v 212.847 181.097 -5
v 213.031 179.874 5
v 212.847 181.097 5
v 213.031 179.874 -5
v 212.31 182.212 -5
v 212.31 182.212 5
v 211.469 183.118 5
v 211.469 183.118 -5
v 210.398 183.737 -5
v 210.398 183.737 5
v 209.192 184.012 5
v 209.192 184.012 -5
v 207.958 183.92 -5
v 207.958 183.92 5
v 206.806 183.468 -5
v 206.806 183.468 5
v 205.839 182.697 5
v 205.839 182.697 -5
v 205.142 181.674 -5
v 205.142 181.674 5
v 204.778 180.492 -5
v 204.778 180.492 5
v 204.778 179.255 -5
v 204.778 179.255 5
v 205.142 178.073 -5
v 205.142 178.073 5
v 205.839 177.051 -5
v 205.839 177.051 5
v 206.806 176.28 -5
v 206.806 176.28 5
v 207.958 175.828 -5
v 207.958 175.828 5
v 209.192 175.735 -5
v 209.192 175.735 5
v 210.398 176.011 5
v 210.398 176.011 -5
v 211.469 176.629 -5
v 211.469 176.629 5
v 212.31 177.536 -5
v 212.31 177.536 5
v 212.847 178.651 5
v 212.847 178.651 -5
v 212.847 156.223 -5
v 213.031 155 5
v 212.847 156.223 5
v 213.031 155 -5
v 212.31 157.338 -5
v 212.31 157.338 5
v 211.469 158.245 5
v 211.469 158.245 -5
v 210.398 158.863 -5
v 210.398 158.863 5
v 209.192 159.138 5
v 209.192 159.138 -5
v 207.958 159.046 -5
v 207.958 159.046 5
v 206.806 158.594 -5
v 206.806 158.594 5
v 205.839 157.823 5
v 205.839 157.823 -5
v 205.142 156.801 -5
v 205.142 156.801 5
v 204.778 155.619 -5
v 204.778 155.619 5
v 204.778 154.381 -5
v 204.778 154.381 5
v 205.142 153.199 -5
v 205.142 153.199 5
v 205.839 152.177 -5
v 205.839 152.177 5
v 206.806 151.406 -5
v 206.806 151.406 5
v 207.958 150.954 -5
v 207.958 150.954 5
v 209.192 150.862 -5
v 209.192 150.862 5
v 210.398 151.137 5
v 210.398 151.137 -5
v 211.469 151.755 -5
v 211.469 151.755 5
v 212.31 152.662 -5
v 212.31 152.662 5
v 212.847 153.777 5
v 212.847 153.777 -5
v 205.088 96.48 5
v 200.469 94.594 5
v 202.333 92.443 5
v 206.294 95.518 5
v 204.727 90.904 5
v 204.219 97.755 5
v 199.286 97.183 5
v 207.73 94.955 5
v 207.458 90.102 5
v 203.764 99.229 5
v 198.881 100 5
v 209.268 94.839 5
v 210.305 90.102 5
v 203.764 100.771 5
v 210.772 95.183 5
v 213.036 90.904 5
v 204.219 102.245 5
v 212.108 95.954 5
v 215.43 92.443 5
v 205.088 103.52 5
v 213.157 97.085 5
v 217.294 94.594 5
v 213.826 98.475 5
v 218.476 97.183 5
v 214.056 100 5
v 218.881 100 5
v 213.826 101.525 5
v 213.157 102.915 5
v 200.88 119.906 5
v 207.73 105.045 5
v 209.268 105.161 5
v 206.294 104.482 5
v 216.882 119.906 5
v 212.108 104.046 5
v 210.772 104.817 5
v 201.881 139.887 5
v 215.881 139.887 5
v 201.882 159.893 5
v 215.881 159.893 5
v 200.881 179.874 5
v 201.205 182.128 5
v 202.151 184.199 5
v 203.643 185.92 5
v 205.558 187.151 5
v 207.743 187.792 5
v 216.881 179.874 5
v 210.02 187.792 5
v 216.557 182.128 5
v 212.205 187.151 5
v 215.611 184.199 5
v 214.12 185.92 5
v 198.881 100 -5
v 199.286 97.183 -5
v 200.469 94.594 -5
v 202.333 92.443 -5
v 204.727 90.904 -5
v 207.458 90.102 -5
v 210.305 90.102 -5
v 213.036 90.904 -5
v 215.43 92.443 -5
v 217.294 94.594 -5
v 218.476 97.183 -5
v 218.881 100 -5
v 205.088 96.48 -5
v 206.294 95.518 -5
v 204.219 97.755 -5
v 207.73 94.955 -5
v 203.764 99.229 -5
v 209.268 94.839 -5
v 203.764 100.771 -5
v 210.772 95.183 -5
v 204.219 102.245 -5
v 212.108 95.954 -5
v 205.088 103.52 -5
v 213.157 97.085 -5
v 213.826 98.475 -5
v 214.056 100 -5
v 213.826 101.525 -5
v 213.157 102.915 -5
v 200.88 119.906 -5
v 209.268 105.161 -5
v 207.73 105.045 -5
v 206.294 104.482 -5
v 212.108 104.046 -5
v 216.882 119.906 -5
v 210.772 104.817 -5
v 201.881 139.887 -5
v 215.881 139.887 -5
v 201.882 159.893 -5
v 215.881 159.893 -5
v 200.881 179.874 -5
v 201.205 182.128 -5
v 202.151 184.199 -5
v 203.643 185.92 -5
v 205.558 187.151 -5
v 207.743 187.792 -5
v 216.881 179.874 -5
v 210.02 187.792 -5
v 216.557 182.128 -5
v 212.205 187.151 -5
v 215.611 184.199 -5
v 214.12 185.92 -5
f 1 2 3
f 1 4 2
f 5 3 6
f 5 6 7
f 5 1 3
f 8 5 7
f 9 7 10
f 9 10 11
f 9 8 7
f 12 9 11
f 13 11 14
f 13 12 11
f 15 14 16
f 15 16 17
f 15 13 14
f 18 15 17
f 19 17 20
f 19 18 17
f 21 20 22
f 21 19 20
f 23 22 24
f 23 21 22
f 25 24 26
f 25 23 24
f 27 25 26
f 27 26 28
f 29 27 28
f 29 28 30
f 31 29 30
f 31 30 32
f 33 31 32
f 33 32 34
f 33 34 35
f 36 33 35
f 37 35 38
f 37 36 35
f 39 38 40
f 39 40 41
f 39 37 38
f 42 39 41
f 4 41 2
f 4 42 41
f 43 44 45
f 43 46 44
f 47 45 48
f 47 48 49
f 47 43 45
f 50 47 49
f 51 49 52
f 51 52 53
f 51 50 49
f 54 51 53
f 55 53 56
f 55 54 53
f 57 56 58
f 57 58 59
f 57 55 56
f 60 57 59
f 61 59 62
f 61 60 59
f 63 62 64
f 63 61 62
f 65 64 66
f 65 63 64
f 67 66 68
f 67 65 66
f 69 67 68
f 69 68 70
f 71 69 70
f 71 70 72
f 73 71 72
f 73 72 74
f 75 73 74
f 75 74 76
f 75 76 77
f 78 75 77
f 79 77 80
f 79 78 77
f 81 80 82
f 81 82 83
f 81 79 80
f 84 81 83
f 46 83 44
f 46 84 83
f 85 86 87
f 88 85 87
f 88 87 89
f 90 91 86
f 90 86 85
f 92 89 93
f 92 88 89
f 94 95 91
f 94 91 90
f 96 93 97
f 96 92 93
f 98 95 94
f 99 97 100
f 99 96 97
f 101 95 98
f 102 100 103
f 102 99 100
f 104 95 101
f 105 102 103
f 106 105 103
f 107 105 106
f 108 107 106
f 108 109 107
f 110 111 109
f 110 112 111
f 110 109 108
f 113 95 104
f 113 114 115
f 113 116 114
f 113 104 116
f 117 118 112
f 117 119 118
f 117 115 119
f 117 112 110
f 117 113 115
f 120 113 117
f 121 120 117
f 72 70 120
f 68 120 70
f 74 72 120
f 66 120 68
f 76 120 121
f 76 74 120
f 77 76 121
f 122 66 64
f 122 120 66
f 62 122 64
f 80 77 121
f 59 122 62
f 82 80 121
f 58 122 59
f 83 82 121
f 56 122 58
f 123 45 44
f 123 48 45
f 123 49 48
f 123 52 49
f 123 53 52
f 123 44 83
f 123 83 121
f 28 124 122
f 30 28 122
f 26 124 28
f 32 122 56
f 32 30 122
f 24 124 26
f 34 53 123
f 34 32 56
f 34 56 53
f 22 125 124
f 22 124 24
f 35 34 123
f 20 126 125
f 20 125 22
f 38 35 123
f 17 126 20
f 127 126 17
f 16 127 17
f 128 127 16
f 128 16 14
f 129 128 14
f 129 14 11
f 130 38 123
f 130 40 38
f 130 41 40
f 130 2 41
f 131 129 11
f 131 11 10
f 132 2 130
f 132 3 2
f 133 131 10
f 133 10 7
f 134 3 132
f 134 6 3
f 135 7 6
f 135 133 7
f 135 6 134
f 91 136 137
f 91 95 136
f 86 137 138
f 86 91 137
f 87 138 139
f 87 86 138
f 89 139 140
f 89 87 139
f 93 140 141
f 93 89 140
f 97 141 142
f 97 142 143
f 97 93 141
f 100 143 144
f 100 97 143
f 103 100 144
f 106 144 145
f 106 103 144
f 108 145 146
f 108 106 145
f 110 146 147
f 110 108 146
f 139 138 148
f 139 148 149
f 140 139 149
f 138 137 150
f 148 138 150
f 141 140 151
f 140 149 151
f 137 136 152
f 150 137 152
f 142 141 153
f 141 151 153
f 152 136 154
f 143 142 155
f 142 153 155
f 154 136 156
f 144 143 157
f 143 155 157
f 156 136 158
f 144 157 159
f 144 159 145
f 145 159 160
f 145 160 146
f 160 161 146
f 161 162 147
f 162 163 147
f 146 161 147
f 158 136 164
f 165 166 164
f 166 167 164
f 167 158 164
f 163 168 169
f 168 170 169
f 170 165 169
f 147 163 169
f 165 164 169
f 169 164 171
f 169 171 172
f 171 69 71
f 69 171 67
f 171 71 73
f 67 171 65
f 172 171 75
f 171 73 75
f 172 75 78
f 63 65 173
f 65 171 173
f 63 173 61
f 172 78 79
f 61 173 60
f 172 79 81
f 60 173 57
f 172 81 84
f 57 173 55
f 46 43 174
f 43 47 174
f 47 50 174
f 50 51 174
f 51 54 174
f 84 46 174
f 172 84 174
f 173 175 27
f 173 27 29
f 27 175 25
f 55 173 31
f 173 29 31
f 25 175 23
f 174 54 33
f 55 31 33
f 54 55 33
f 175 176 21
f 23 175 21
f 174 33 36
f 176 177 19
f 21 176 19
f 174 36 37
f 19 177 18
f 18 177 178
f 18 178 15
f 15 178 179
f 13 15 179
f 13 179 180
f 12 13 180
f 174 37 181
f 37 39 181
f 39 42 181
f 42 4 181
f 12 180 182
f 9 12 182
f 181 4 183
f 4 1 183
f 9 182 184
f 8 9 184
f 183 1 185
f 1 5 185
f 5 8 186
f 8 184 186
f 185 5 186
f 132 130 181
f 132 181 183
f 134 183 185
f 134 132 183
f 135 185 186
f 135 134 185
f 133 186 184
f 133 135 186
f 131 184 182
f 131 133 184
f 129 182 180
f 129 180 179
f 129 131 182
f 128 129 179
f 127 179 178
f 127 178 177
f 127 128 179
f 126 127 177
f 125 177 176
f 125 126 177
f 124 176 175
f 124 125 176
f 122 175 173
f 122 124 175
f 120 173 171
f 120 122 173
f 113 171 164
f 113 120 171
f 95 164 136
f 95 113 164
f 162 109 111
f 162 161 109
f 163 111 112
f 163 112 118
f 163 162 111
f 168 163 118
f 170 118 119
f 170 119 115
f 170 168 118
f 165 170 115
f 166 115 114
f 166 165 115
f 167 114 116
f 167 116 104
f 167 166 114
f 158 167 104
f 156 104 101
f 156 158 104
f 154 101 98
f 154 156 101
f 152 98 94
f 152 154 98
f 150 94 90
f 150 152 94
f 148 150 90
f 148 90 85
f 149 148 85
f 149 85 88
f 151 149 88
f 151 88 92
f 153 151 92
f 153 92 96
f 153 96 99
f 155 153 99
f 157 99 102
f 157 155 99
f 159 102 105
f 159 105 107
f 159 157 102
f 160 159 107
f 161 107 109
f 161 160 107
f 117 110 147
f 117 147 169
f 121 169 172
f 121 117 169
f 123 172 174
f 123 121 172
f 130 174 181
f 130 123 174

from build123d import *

# Parameters (mm, degrees)
ESBO_O1_R                = 4.15
ESBO_O1_R_2              = 5.175
RESSALTO_EXTRUS_O1_DEPTH = 5


with BuildPart() as part:
    # Esboço1 → Ressalto-extrusão1 (new, symmetric)
    with BuildSketch(Plane.XY):
        with BuildLine():
            ThreePointArc((198.88140452, 100), (208.88140452, 90), (218.88140452, 100))
            ThreePointArc((218.88140452, 100), (215.88140452, 139.886857429), (216.88140452, 179.873872767))
            ThreePointArc((216.88140452, 179.873872767), (208.88140452, 187.873872767), (200.88140452, 179.873872767))
            ThreePointArc((200.88140452, 179.873872767), (201.88140452, 139.886857429), (198.88140452, 100))
        make_face()
        with Locations((208.88140452, 155)):
            Circle(ESBO_O1_R, mode=Mode.SUBTRACT)
        with Locations((208.88140452, 179.873872767)):
            Circle(ESBO_O1_R, mode=Mode.SUBTRACT)
        with Locations((208.88140452, 100)):
            Circle(ESBO_O1_R_2, mode=Mode.SUBTRACT)
    extrude(amount=RESSALTO_EXTRUS_O1_DEPTH, both=True)


solid = part.part
